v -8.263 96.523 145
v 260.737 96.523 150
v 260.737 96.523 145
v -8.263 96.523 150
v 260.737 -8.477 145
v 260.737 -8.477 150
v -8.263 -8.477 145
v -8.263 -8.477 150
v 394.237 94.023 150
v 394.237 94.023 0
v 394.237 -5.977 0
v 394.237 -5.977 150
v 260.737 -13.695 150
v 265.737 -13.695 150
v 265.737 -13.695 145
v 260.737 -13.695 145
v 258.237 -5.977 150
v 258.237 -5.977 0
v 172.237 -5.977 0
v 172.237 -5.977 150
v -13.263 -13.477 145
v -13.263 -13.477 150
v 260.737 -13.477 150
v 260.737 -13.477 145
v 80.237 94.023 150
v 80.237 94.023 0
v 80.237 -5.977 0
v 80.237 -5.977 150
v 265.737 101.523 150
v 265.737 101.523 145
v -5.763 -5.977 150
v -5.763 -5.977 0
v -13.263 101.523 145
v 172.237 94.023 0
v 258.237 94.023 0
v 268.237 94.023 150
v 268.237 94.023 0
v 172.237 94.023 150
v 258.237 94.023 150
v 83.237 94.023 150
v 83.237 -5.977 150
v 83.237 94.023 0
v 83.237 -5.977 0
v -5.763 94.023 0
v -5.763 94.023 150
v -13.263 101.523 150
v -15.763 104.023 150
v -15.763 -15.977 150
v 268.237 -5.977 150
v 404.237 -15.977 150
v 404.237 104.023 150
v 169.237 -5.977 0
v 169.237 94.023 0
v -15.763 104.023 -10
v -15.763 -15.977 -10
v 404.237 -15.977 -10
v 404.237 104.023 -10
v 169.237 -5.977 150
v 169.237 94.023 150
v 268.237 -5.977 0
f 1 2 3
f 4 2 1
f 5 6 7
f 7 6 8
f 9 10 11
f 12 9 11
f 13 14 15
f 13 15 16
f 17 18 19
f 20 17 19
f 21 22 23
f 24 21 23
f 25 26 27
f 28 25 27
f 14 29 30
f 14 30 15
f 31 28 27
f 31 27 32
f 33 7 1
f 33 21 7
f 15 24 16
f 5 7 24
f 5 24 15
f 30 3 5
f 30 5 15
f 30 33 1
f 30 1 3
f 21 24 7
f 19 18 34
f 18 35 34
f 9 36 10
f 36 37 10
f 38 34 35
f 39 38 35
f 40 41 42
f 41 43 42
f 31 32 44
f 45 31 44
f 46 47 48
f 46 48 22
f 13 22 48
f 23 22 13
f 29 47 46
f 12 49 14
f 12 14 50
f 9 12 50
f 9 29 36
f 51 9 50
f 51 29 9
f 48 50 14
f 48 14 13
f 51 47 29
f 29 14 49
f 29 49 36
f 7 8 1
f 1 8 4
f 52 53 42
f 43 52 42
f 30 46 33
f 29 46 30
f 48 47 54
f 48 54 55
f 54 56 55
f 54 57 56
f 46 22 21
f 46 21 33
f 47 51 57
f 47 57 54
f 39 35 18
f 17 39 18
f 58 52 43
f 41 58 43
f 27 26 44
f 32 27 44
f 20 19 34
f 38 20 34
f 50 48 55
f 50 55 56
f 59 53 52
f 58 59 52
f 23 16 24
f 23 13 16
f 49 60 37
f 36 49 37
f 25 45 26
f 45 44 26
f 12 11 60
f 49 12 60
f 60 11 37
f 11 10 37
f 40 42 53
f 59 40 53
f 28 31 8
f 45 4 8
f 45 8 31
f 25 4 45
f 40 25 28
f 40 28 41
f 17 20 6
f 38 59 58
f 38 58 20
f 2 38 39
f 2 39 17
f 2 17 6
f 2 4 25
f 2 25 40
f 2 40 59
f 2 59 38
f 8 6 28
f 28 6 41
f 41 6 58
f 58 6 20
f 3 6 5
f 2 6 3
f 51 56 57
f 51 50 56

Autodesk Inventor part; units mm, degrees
ref_plane "YZ Plane" through (0, 0, 0) normal (1, 0, 0) x (0, 1, 0)
ref_plane "XZ Plane" through (0, 0, 0) normal (0, 1, 0) x (-1, 0, 0)
ref_plane "XY Plane" through (0, 0, 0) normal (0, 0, 1) x (1, 0, 0)
sketch "Skizze1" plane through (0, 0, 0) normal (0, 0, 1) x (1, 0, 0)
  line L0 (-99.7629, 0) -> (488.2371, 0) projected
  line L1 (0, -39.9766) -> (0, 128.0234) projected
  line L2 (-5.7629, 94.0234) -> (394.2371, 94.0234)
  line L3 (394.2371, 94.0234) -> (394.2371, -5.9766)
  line L4 (394.2371, -5.9766) -> (-5.7629, -5.9766)
  line L5 (-5.7629, -5.9766) -> (-5.7629, 94.0234)
  line L6 (80.2371, 94.0234) -> (80.2371, -5.9766)
  line L7 (83.2371, -5.9766) -> (83.2371, 94.0234)
  line L8 (169.2371, 94.0234) -> (169.2371, -5.9766)
  line L9 (172.2371, -5.9766) -> (172.2371, 94.0234)
  line L10 (258.2371, 94.0234) -> (258.2371, -5.9766)
  line L11 (268.2371, -5.9766) -> (268.2371, 94.0234)
  line L12 (-15.7629, 104.0234) -> (404.2371, 104.0234)
  line L13 (404.2371, 104.0234) -> (404.2371, -15.9766)
  line L14 (404.2371, -15.9766) -> (-15.7629, -15.9766)
  line L15 (-15.7629, -15.9766) -> (-15.7629, 104.0234)
  point P0 (0, 0)
  point P1 (274.2371, 94.0234)
  point P2 (180.9371, 94.0234)
  point P3 (87.6371, 94.0234)
  dimension "d0" = 100
  dimension "d1" = 400
  dimension "d2" = 120
  dimension "d11" = 10
  dimension "d12" = 10
  dimension "d13" = 10
  dimension "d14" = 10
  dimension "d20" = 86
  dimension "d21" = 86
  dimension "d22" = 86
  dimension "d23" = 3
  dimension "d24" = 3
  dimension "d25" = 10
extrude "Extrusion1" add sketch "Skizze1" along normal blind 150 contours L15 L12 L1 L2 L5 L0 | L0 L5 L4 L1 L14 L15 | L1 L4 L3 L0 L13 L14 | L12 L13 L0 L3 L2 L1 | L6 L2 L7 L0 | L0 L7 L4 L6 | L8 L2 L9 L0 | L0 L9 L4 L8 | L11 L4 L10 L0 | L0 L10 L2 L11
sketch "Skizze2" plane through (0, 0, 0) normal (0, 0, -1) x (-1, 0, 0)
  line L0 (15.7629, -15.9766) -> (-404.2371, -15.9766) projected
  line L1 (-404.2371, -15.9766) -> (-404.2371, 104.0234) projected
  line L2 (15.7629, -15.9766) -> (-404.2371, -15.9766)
  line L3 (-404.2371, -15.9766) -> (-404.2371, 104.0234)
  line L4 (-404.2371, 104.0234) -> (15.7629, 104.0234)
  line L5 (15.7629, 104.0234) -> (15.7629, -15.9766)
  point P0 (0, 0)
extrude "Extrusion2" add sketch "Skizze2" along normal blind 10
sketch "Skizze3" plane through (80.2371, -5.9766, 150) normal (-1, 0, 0) x (0, 0, 1)
  point P0 (-150, 5.9766)
sketch "Skizze4" plane through (0, 0, 150) normal (0, 0, 1) x (1, 0, 0)
  line L0 (-13.2629, 101.5234) -> (265.7371, 101.5234)
  line L1 (265.7371, 101.5234) -> (265.7371, 96.5234)
  line L2 (265.7371, 96.5234) -> (-13.2629, 96.5234)
  line L3 (-13.2629, 96.5234) -> (-13.2629, 101.5234)
  line L4 (260.7371, 96.5234) -> (265.7371, 96.5234)
  line L5 (265.7371, 96.5234) -> (265.7371, -13.6946)
  line L6 (265.7371, -13.6946) -> (260.7371, -13.6946)
  line L7 (260.7371, -13.6946) -> (260.7371, 96.5234)
  line L8 (260.7371, -8.4766) -> (-13.2629, -8.4766)
  line L9 (-13.2629, -8.4766) -> (-13.2629, -13.4766)
  line L10 (-13.2629, -13.4766) -> (260.7371, -13.4766)
  line L11 (260.7371, -13.4766) -> (260.7371, -8.4766)
  line L12 (-13.2629, -8.4766) -> (-8.2629, -8.4766)
  line L13 (-8.2629, -8.4766) -> (-8.2629, 96.5234)
  line L14 (-8.2629, 96.5234) -> (-13.2629, 96.5234)
  line L15 (-13.2629, 96.5234) -> (-13.2629, -8.4766)
  line L16 (404.2371, 104.0234) -> (-15.7629, 104.0234) projected
  line L17 (-5.7629, 94.0234) -> (80.2371, 94.0234) projected
  line L18 (-5.7629, -5.9766) -> (-5.7629, 94.0234) projected
  line L19 (-15.7629, 104.0234) -> (-15.7629, -15.9766) projected
  line L20 (80.2371, -5.9766) -> (-5.7629, -5.9766) projected
  line L21 (-15.7629, -15.9766) -> (404.2371, -15.9766) projected
  line L22 (258.2371, 94.0234) -> (258.2371, -5.9766) projected
  line L23 (268.2371, -5.9766) -> (268.2371, 94.0234) projected
  point P0 (0, 0)
  point P1 (400.2371, 104.0234)
  point P2 (-11.7629, 104.0234)
  point P3 (-15.7629, 100.0234)
  point P4 (-15.7629, -11.9766)
  point P5 (-11.7629, -15.9766)
  point P6 (400.2371, -15.9766)
  point P7 (-13.2629, 96.5234)
  dimension "d26" = 2.5
  dimension "d27" = 2.5
  dimension "d28" = 2.5
  dimension "d29" = 2.5
  dimension "d30" = 2.5
  dimension "d31" = 2.5
  dimension "d32" = 2.5
  dimension "d33" = 2.5
  dimension "d34" = 2.5
extrude "Extrusion3" cut sketch "Skizze4" against normal blind 5 contours L0 L1 L2 L3 | L2 L13 L8 L15 | L5 L6 L7 L2 | L8 L7 L10 L9
properties part number "3Eier_größer" material "Acetalharz, Schwarz"
